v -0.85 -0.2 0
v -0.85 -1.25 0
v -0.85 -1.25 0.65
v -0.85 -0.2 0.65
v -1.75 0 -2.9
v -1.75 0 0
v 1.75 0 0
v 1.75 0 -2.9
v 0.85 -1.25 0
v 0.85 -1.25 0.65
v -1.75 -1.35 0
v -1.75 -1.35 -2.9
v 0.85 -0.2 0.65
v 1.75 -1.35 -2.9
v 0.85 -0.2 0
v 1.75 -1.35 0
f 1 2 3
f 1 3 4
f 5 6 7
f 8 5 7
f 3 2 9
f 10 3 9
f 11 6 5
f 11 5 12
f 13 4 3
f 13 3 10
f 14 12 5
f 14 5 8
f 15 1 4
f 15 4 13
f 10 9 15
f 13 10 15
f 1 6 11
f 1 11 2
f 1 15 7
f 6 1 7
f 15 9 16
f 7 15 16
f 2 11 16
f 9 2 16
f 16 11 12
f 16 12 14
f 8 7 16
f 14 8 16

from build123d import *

# Parameters (mm, degrees)
SKETCH1_W           = 3.5
SKETCH1_H           = 1.35
BOSS_EXTRUDE1_DEPTH = 2.9
SKETCH2_W           = 1.7
SKETCH2_H           = 1.05
BOSS_EXTRUDE2_DEPTH = 0.65


with BuildPart() as part:
    # Sketch1 → Boss-Extrude1 (new body)
    with BuildSketch(Plane(origin=(0, 0, 0), x_dir=(1, 0, 0), z_dir=(0, 0, -1))):
        with Locations((0, 0.675)):
            Rectangle(SKETCH1_W, SKETCH1_H)
    extrude(amount=BOSS_EXTRUDE1_DEPTH)

    # Sketch2 → Boss-Extrude2 (add)
    with BuildSketch(Plane.XY):
        with Locations((0, -0.725)):
            Rectangle(SKETCH2_W, SKETCH2_H)
    extrude(amount=BOSS_EXTRUDE2_DEPTH)


solid = part.part
